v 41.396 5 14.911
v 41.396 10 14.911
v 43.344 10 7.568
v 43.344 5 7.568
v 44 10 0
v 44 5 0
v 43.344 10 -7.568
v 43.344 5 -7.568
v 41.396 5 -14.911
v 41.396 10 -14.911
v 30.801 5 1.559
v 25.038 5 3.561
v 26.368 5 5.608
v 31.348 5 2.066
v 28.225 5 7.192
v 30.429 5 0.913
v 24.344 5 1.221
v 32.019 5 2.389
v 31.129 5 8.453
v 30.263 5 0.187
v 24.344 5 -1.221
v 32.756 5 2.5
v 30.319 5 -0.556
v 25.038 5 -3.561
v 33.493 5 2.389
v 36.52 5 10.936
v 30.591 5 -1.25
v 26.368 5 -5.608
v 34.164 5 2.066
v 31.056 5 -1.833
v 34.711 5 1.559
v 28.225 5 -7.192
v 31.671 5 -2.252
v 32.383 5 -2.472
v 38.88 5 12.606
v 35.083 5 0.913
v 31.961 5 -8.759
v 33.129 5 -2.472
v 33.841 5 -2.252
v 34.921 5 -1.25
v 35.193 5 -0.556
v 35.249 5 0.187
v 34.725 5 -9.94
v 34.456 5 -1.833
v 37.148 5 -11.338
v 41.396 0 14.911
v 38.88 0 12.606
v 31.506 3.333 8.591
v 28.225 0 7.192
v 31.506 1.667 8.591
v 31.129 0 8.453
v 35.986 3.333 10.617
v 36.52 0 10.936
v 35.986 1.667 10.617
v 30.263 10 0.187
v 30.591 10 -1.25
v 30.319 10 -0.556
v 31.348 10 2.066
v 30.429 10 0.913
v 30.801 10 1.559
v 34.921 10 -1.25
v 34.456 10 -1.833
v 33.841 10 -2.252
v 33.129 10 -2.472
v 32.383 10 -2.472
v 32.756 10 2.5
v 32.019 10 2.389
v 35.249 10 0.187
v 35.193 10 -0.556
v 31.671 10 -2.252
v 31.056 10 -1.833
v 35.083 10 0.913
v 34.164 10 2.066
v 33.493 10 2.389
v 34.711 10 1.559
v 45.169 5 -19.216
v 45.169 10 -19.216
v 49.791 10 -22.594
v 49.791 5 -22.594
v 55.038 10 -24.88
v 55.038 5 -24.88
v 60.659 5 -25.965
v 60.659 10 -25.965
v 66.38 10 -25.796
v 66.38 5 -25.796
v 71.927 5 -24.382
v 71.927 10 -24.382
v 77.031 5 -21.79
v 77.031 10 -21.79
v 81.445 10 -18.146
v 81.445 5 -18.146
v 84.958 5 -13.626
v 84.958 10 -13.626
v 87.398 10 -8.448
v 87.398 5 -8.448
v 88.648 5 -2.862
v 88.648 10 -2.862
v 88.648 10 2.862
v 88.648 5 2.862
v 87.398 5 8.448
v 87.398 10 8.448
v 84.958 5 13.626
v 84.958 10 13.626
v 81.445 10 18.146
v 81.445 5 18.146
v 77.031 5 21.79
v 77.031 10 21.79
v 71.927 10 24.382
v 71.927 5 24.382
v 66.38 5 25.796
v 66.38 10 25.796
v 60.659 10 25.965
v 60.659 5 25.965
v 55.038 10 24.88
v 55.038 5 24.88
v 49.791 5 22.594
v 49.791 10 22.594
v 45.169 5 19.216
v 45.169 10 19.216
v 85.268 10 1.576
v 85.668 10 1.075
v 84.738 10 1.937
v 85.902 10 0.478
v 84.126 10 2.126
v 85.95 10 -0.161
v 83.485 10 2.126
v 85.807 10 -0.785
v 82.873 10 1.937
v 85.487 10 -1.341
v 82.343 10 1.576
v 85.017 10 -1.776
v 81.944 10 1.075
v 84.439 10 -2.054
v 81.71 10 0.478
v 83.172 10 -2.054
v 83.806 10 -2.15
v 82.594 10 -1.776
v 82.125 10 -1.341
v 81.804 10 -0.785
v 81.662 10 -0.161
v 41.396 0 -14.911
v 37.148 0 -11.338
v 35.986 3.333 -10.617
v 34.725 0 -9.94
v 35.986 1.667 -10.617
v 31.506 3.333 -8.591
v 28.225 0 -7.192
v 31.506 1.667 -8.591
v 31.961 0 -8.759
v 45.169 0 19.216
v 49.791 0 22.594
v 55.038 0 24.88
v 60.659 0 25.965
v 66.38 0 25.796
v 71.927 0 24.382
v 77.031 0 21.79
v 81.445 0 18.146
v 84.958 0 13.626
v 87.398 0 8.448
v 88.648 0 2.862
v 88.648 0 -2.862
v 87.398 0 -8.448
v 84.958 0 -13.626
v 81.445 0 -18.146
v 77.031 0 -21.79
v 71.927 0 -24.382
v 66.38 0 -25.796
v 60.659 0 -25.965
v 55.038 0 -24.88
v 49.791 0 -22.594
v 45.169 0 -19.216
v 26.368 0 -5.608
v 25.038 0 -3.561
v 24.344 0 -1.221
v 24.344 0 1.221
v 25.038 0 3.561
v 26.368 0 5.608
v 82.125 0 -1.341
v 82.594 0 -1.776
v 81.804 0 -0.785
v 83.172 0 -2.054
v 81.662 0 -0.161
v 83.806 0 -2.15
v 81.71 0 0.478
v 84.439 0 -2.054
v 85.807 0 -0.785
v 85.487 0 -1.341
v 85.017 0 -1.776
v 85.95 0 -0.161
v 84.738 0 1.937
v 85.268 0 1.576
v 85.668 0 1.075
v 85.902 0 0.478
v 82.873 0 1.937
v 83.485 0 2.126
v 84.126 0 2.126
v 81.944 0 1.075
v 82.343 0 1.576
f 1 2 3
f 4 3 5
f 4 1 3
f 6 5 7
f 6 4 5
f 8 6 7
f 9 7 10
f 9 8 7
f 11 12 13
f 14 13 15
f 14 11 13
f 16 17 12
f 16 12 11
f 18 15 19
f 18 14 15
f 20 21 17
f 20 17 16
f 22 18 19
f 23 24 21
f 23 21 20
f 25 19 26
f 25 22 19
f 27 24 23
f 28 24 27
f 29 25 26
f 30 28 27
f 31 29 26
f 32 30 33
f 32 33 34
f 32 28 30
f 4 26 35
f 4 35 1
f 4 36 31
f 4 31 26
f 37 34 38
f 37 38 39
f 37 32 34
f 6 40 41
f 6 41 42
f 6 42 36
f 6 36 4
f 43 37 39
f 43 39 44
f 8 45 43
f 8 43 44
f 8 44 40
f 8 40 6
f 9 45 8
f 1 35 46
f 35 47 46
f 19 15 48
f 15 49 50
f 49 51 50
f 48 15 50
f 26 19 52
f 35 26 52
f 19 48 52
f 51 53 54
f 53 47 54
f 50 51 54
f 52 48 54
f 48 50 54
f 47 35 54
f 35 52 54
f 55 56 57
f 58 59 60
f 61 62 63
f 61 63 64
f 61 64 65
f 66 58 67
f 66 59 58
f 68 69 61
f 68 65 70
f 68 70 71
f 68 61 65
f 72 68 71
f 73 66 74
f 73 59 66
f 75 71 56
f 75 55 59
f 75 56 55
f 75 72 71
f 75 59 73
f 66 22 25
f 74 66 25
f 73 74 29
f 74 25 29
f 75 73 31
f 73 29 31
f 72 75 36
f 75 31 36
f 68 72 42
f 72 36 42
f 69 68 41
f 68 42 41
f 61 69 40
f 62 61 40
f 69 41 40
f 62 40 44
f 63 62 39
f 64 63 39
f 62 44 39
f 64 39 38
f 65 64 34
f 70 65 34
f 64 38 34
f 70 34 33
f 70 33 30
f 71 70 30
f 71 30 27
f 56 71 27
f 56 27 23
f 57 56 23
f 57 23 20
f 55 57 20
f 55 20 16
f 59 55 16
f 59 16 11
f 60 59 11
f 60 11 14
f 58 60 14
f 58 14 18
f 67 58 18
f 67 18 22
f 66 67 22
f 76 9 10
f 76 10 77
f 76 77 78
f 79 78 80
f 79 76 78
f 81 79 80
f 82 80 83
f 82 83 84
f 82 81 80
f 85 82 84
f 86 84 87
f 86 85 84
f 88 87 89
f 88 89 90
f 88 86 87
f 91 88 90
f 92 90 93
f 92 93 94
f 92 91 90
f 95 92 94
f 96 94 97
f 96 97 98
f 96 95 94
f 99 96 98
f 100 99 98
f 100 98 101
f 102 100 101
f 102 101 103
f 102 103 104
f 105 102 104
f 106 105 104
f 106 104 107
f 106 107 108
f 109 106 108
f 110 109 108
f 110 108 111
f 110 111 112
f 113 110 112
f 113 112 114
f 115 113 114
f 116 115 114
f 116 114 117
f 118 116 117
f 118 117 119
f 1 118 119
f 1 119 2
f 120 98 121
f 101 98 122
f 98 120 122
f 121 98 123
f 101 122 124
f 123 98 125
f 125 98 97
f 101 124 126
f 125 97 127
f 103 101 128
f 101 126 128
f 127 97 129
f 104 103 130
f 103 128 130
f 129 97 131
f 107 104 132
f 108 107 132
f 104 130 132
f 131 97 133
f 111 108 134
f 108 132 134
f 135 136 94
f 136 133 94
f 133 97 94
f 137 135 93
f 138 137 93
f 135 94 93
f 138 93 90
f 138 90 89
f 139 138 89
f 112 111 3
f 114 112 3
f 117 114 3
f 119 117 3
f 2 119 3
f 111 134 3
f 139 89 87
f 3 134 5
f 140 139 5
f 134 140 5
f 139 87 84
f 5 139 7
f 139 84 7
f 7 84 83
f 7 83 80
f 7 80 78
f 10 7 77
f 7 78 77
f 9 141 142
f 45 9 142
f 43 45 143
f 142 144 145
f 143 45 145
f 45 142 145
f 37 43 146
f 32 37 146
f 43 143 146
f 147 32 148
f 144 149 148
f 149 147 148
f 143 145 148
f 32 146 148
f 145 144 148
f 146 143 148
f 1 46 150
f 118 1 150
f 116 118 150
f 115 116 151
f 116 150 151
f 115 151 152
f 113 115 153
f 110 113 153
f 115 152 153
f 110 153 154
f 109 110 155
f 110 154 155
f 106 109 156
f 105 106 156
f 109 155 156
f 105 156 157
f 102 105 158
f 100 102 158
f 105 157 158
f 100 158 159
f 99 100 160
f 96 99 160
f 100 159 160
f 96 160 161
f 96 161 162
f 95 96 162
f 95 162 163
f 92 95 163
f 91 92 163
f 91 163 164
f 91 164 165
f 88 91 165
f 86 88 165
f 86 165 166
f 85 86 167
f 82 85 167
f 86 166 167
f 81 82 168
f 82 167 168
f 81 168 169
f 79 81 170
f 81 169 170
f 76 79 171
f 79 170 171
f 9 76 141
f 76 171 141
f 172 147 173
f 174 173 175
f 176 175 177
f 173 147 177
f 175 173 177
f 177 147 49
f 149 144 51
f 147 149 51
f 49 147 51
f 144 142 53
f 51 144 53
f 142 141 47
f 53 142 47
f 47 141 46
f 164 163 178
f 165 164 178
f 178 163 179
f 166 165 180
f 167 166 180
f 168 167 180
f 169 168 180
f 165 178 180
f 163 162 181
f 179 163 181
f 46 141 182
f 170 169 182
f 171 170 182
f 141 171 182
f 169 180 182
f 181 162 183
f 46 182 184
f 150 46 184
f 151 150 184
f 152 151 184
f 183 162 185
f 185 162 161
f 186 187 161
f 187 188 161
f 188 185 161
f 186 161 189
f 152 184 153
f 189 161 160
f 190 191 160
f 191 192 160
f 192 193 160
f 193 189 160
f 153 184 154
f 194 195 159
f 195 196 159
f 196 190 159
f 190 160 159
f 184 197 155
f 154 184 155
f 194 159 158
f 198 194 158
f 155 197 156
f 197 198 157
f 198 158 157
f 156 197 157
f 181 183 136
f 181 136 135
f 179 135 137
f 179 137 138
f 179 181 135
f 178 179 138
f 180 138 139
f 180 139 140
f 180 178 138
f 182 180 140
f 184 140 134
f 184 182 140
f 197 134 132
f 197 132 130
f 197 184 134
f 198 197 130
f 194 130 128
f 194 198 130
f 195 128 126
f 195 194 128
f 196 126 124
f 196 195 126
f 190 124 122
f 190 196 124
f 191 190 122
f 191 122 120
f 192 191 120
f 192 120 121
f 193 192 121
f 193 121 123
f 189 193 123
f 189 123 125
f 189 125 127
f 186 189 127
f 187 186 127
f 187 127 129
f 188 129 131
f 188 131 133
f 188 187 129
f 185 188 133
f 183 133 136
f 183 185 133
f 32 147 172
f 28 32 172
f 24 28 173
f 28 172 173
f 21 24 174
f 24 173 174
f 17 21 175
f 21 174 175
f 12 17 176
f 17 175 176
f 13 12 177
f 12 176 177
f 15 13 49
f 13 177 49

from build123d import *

# Parameters (mm, degrees)
SKETCH2_R           = 2.15
BOSS_EXTRUDE2_DEPTH = 5
SKETCH2_4_R         = 2.5
BOSS_EXTRUDE3_DEPTH = 10
SKETCH2_5_R         = 2.15
CUT_EXTRUDE1_DEPTH  = 10


with BuildPart() as part:
    # Sketch2 → Boss-Extrude2 (new body)
    with BuildSketch(Plane(origin=(0, 0, 0), x_dir=(1, 0, 0), z_dir=(0, 1, 0))):
        with BuildLine():
            ThreePointArc((41.396346652, -14.911153002), (88.805627965, 0), (41.396346652, 14.911153002))
            add(Edge.make_bspline(
                [(41.396346652, 14.911153002), (35.610115035, 8.935267229), (30.816373967, 8.824209594), (28.225205258, 7.191755049)],
                knots=[0.924562573, 0.924562573, 0.924562573, 0.924562573, 1.924562573, 1.924562573, 1.924562573, 1.924562573], degree=3))
            ThreePointArc((28.225205258, 7.191755049), (24.256061614, 0), (28.225205258, -7.191755049))
            add(Edge.make_bspline(
                [(28.225205258, -7.191755049), (30.816373967, -8.824209594), (35.610115035, -8.935267229), (41.396346652, -14.911153002)],
                knots=[0, 0, 0, 0, 1, 1, 1, 1], degree=3))
        make_face()
        with Locations(Location((83.805627965, 0, 0), (0, 0, 270))):
            Circle(SKETCH2_R, mode=Mode.SUBTRACT)
    extrude(amount=BOSS_EXTRUDE2_DEPTH)

    # Sketch2<4> → Boss-Extrude3 (add)
    with BuildSketch(Plane(origin=(0, 0, 0), x_dir=(1, 0, 0), z_dir=(0, 1, 0))):
        with Locations(Location((32.756061614, 0, 0), (0, 0, 270))):
            Circle(SKETCH2_4_R)
        with BuildLine():
            ThreePointArc((41.396346652, 14.911153002), (88.805627965, 0), (41.396346652, -14.911153002))
            ThreePointArc((41.396346652, -14.911153002), (44, 0), (41.396346652, 14.911153002))
        make_face()
    extrude(amount=BOSS_EXTRUDE3_DEPTH)

    # Sketch2<5> → Cut-Extrude1 (cut)
    with BuildSketch(Plane(origin=(0, 0, 0), x_dir=(1, 0, 0), z_dir=(0, 1, 0))):
        with Locations(Location((83.805627965, 0, 0), (0, 0, 90))):
            Circle(SKETCH2_5_R)
    extrude(amount=CUT_EXTRUDE1_DEPTH, mode=Mode.SUBTRACT)


solid = part.part
